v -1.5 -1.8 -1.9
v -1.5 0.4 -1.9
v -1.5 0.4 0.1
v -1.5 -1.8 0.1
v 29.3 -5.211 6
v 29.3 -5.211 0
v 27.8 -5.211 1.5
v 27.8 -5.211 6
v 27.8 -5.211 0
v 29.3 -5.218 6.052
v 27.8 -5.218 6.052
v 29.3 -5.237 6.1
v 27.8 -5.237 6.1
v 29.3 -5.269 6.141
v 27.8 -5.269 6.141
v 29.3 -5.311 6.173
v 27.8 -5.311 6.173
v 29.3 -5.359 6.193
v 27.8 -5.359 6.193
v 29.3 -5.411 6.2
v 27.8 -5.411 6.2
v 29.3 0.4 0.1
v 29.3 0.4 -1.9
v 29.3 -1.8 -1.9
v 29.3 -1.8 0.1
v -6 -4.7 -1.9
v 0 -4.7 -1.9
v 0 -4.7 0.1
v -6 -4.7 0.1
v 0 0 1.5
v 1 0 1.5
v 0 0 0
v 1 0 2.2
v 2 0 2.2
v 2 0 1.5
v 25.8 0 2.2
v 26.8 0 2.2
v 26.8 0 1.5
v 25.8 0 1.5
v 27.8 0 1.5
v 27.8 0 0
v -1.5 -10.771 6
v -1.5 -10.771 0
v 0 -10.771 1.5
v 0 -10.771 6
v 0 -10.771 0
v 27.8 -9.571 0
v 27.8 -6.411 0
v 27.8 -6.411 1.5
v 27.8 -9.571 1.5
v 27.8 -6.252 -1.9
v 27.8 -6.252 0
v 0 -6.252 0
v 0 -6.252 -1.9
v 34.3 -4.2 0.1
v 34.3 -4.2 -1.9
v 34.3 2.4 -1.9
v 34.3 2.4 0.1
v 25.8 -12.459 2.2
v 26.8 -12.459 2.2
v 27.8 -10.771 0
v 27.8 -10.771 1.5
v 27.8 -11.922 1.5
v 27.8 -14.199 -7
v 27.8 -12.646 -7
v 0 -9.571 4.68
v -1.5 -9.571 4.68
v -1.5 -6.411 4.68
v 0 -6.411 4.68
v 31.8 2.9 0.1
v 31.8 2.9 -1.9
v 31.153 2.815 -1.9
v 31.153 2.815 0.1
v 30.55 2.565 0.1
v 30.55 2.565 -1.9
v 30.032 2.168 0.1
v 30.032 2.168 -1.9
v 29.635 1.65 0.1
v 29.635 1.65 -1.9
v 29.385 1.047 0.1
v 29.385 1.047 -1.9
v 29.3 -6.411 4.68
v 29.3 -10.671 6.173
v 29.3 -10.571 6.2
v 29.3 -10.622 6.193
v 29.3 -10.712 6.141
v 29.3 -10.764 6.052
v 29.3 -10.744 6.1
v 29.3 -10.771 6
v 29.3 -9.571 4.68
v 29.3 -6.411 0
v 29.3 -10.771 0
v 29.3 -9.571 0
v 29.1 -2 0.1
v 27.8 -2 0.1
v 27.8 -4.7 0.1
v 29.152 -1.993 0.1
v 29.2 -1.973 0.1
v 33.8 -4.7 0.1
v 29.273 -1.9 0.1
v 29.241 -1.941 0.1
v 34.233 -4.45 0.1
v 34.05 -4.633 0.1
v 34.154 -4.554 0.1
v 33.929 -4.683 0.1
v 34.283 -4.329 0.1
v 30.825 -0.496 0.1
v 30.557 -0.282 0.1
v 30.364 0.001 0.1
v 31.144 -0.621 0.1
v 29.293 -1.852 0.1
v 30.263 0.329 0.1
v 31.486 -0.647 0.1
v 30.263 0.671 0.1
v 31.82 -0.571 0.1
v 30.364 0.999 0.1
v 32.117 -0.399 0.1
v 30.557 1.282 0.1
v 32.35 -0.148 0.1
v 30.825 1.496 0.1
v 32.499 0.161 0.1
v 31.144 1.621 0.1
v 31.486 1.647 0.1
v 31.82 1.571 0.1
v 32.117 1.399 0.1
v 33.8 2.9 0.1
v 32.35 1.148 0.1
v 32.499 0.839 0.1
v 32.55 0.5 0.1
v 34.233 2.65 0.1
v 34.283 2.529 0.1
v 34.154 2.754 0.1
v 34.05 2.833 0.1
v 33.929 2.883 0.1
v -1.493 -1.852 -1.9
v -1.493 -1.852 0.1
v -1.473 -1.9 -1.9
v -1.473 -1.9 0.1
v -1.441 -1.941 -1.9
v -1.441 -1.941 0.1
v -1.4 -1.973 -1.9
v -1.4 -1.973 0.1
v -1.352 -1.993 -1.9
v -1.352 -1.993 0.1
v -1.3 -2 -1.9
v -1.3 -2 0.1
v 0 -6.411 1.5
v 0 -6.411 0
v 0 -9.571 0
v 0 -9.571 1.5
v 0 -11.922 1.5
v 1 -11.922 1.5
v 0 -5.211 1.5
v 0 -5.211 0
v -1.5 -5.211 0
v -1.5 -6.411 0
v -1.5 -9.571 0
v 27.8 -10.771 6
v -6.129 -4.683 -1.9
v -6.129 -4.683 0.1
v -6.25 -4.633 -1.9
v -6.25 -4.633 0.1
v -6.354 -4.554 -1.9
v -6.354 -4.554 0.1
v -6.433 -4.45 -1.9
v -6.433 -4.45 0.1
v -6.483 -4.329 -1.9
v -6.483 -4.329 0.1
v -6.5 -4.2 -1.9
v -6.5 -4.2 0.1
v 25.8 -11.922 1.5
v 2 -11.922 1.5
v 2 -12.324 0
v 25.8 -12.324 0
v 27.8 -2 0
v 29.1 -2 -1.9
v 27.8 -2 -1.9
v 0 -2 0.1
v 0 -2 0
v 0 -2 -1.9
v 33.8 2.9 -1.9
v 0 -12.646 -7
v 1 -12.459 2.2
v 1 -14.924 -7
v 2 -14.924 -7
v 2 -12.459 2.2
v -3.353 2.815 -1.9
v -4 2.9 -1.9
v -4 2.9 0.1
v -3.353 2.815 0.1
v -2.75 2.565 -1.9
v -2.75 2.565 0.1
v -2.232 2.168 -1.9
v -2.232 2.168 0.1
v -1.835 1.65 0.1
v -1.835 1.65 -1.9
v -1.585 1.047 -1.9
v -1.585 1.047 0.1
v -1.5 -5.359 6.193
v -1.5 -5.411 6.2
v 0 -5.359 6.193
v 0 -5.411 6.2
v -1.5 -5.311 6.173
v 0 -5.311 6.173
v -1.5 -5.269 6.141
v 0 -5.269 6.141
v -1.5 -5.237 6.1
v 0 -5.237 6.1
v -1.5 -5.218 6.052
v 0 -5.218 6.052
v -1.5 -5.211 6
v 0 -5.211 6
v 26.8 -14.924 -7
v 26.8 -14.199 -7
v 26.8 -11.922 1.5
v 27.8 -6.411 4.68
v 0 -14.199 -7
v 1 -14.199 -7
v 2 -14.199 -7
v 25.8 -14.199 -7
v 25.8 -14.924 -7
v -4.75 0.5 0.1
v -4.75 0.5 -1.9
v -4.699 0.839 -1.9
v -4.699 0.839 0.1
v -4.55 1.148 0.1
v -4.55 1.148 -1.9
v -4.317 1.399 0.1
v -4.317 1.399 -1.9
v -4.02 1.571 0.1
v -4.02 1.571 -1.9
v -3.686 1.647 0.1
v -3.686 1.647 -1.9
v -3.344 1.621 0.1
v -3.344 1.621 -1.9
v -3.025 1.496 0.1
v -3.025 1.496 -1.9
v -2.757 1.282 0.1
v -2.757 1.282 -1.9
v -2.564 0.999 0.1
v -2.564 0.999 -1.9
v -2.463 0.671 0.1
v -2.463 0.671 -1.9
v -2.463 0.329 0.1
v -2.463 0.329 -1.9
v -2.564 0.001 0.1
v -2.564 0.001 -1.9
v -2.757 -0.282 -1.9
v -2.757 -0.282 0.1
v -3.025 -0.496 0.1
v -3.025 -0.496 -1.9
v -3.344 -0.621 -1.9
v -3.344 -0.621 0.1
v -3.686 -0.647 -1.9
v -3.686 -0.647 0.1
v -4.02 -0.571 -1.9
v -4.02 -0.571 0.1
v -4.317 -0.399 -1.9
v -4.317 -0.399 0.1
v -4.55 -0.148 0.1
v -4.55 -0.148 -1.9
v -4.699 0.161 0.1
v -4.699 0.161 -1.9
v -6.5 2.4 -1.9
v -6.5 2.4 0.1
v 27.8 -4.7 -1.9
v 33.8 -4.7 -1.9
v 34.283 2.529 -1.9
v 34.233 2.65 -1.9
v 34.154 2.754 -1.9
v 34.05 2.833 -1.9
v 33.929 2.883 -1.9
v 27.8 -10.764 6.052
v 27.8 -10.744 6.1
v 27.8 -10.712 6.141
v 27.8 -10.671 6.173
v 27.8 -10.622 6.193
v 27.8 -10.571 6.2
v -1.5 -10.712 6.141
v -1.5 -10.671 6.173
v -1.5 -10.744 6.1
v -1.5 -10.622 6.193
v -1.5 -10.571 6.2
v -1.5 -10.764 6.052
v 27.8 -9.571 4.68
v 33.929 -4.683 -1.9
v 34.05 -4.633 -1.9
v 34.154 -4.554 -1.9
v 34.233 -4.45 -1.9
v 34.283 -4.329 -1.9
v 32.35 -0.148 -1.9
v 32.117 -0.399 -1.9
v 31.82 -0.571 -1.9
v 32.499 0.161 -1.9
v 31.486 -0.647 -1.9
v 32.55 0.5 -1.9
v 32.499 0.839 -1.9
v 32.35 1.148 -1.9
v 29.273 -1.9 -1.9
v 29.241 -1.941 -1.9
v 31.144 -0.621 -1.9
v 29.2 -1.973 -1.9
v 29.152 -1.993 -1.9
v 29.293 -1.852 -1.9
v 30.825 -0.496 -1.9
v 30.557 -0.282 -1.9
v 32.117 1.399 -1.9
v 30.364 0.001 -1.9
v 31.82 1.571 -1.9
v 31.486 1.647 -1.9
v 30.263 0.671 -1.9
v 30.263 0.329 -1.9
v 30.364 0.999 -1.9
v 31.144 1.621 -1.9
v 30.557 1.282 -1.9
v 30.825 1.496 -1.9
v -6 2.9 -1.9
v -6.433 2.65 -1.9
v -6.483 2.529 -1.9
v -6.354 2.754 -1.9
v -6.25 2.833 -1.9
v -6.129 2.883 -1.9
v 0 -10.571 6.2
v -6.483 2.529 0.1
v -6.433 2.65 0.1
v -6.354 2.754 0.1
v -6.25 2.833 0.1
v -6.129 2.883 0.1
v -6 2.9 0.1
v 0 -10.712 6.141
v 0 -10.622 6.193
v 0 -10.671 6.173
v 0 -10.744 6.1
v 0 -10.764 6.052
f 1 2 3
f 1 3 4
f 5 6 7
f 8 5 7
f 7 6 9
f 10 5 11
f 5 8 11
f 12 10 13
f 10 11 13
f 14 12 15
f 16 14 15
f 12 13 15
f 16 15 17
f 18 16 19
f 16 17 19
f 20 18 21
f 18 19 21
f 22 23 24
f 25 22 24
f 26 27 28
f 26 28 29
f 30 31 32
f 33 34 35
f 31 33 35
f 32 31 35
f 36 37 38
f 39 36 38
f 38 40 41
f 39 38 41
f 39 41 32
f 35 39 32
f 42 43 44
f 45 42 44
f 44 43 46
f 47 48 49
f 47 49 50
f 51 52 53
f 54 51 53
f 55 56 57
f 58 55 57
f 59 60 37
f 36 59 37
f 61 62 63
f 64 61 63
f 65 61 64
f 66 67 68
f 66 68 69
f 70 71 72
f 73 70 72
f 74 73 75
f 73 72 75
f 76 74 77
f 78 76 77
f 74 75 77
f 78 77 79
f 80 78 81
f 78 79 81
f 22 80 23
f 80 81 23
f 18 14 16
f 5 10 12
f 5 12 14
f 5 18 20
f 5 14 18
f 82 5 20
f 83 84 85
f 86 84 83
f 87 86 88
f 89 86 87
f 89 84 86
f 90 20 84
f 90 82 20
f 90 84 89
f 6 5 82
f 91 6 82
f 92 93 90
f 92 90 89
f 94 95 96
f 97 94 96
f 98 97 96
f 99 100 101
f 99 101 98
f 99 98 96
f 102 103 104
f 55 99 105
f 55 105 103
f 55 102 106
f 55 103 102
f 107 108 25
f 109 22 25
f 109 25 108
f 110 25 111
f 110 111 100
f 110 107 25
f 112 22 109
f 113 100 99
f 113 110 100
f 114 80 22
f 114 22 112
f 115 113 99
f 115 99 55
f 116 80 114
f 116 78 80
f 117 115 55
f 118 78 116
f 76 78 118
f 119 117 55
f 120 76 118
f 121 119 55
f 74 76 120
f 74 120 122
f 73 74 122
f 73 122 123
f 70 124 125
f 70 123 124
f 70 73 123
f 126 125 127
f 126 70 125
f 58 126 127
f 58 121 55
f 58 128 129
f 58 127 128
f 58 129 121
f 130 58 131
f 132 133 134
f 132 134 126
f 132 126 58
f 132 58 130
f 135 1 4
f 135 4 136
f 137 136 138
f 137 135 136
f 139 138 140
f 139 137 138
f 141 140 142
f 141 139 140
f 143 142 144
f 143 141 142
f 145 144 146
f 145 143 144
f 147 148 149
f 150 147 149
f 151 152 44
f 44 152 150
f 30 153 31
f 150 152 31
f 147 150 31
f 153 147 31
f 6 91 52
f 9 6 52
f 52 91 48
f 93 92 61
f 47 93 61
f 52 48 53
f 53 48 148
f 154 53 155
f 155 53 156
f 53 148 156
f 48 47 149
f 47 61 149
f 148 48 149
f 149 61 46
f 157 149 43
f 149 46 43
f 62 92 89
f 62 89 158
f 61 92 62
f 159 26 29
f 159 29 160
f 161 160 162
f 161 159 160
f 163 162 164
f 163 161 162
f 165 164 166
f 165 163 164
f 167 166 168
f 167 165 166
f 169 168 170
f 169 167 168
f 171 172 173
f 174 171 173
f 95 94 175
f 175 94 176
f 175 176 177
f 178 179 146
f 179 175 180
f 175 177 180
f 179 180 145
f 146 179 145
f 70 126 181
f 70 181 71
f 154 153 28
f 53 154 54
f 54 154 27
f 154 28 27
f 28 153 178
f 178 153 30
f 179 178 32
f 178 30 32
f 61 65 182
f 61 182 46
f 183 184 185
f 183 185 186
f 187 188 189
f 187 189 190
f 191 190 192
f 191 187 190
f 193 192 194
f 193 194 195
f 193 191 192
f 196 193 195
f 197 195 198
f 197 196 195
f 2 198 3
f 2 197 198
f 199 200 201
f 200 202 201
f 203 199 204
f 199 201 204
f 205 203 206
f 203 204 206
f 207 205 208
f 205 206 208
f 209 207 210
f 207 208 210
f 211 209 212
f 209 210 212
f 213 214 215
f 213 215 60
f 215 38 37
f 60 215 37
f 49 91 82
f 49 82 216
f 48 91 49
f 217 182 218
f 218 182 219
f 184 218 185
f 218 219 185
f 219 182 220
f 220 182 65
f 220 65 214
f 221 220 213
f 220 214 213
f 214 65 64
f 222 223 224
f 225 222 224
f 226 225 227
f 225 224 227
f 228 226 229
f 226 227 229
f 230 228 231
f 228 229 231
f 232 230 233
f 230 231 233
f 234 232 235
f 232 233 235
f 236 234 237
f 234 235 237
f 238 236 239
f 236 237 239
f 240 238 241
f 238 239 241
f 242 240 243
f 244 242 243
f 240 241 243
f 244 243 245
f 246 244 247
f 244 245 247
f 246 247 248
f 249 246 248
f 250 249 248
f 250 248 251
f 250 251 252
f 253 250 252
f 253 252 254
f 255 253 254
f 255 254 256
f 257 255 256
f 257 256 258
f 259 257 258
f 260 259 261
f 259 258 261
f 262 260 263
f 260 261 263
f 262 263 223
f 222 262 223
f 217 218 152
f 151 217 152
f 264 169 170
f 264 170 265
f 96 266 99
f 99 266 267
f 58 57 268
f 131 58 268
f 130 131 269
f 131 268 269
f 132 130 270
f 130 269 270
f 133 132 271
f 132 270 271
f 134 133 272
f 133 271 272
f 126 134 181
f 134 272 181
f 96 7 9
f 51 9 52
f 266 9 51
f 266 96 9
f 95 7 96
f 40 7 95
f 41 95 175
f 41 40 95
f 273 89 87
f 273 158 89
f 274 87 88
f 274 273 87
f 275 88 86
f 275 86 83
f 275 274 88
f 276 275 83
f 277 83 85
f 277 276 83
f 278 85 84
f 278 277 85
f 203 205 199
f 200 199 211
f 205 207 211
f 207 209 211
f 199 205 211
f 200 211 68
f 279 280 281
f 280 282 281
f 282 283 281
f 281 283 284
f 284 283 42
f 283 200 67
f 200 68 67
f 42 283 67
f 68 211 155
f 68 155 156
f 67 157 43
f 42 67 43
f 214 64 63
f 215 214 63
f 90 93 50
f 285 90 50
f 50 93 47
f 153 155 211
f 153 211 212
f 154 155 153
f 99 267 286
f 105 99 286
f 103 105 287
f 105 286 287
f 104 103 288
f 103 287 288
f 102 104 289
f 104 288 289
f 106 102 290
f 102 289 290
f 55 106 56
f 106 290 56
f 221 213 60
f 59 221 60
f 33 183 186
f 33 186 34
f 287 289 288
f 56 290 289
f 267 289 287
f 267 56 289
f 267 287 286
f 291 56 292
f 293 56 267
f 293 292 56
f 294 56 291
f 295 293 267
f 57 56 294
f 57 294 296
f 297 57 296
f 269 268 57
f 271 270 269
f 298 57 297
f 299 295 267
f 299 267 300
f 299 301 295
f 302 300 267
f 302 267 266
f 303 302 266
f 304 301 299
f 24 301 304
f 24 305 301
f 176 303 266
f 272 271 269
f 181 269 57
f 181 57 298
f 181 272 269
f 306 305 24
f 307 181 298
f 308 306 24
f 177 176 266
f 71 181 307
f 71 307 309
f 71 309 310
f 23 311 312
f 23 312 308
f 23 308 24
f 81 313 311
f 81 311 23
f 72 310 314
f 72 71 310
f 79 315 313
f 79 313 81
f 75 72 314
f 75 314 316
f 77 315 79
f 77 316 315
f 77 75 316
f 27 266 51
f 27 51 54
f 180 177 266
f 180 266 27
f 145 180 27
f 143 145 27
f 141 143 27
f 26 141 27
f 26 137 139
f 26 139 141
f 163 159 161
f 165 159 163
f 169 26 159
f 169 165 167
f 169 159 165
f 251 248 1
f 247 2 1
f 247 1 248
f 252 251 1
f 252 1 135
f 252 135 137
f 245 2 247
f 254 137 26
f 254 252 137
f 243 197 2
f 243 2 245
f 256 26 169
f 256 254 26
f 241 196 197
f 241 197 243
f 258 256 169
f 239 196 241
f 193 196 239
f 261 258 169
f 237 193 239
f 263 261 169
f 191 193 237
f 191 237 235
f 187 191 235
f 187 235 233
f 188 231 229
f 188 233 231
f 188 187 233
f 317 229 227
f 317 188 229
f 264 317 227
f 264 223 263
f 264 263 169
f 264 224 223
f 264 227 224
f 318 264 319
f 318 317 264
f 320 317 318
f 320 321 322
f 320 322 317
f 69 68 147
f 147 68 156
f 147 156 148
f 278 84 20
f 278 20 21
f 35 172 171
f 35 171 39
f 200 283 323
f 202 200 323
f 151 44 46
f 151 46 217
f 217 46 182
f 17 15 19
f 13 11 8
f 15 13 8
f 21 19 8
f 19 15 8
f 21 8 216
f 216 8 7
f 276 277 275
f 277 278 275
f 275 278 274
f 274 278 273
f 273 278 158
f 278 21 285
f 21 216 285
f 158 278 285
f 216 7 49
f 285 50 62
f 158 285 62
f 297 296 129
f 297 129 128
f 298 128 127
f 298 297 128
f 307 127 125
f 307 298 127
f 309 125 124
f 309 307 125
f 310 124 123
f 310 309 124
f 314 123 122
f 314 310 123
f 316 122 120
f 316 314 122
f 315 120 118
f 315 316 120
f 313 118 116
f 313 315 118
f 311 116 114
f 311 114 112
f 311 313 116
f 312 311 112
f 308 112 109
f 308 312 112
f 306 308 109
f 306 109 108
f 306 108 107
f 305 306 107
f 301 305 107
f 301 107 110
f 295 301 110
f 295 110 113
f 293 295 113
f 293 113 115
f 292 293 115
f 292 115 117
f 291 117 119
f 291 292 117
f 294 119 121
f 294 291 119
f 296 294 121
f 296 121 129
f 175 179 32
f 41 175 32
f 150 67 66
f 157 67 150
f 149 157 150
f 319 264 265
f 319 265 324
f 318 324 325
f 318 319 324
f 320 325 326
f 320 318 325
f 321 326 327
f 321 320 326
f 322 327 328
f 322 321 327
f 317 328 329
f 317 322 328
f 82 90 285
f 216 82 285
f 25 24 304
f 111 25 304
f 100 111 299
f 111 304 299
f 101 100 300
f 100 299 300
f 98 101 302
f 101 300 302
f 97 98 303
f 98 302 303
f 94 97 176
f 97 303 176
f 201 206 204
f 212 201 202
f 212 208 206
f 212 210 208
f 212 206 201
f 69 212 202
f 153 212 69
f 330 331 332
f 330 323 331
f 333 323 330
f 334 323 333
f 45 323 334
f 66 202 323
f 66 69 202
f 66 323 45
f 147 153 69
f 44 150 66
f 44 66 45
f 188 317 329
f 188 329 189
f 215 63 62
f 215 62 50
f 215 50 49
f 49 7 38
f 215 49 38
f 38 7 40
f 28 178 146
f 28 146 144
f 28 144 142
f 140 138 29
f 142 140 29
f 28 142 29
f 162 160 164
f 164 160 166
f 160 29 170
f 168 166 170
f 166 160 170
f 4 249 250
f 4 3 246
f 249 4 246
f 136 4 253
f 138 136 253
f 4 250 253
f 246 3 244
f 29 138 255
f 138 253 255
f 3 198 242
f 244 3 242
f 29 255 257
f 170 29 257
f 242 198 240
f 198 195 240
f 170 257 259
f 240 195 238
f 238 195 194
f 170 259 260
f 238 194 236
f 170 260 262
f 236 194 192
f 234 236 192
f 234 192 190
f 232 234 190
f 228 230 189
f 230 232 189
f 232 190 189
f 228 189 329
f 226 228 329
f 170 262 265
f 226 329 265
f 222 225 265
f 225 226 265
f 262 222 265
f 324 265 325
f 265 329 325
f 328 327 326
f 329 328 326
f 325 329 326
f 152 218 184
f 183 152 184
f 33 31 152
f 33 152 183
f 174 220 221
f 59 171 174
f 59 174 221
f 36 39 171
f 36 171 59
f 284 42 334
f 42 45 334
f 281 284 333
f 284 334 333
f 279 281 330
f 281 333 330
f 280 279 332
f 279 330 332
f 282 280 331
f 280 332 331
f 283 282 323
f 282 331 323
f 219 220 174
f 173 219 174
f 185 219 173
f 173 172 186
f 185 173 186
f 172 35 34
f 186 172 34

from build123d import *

# Parameters (mm, degrees)
SKETCH_1_W          = 27.8
SKETCH_1_H          = 8
EXTRUDE_1_DEPTH     = 7.8
EXTRUDE_2_DEPTH     = 27.8
SKETCH_4_R          = 1.15
EXTRUDE_3_DEPTH     = 2
CUT_EXTRUDE_4_DEPTH = 24.8
SKETCH_15_W         = 27.8
SKETCH_15_H         = 4.251772847
EXTRUDE_4_DEPTH     = 1.9
FILLET_1_R          = 8
FILLET_2_R          = 6.5
EXTRUDE_5_DEPTH     = 27.8
CUT_EXTRUDE_6_DEPTH = 24.8
SKETCH_19_OUTSIDE_W = 26.556
SKETCH_19_OUTSIDE_H = 34.032
CUT_EXTRUDE_7_DEPTH = 40.8
SKETCH_20_W         = 1.5
SKETCH_20_H         = 5.56
EXTRUDE_6_DEPTH     = 6.2
SKETCH_21_W         = 1.5
SKETCH_21_H         = 3.16
CUT_EXTRUDE_8_DEPTH = 4.68
EXTRUDE_7_DEPTH     = 1
FILLET_3_R          = 0.2


with BuildPart() as part:
    # 草图1 → 凸台-拉伸1 (new body)
    with BuildSketch(Plane.XY):
        with Locations((13.9, -4)):
            Rectangle(SKETCH_1_W, SKETCH_1_H)
    extrude(amount=EXTRUDE_1_DEPTH)

    # 草图2 → 凸台-拉伸2 (add)
    with BuildSketch(Plane.ZY):
        Polygon((5.795554958, -15.947085729), (0, -17.5), (0, -8), (7.8, -8), align=None)
    extrude(amount=-EXTRUDE_2_DEPTH)

    # 草图4 → 凸台-拉伸3 (add)
    with BuildSketch(Plane(origin=(0, 0, -1.9), x_dir=(-1, 0, 0), z_dir=(0, 0, -1))):
        with BuildLine():
            Line((0, -2), (0, -4.7))
            Line((0, -4.7), (6, -4.7))
            ThreePointArc((6, -4.7), (6.353553391, -4.553553391), (6.5, -4.2))
            Line((6.5, -4.2), (6.5, -2))
            Line((6.5, -2), (6.5, 2.4))
            ThreePointArc((6.5, 2.4), (6.353553391, 2.753553391), (6, 2.9))
            Line((6, 2.9), (4, 2.9))
            ThreePointArc((4, 2.9), (2.232233047, 2.167766953), (1.5, 0.4))
            Line((1.5, 0.4), (1.5, -1.8))
            ThreePointArc((1.5, -1.8), (1.441421356, -1.941421356), (1.3, -2))
            Line((1.3, -2), (0, -2))
        make_face()
        with Locations((3.6, 0.5)):
            Circle(SKETCH_4_R, mode=Mode.SUBTRACT)
    extrude_3 = extrude(amount=-EXTRUDE_3_DEPTH)

    # 镜向1: 凸台-拉伸3 across plane
    add(extrude_3.mirror(Plane.ZY.offset(-13.9)))

    # 草图13 → 切除-拉伸4 (cut)
    with BuildSketch(Plane.ZY.offset(-1.5)):
        Polygon((1.5, 0), (1.5, -11.921695309), (0, -12.323619098), (0, -15.947085729), (4.556522218, -14.726169281), (6.3, -7.813748582), (6.3, 0), align=None)
    extrude(amount=-CUT_EXTRUDE_4_DEPTH, mode=Mode.SUBTRACT)

    # 草图15 → 凸台-拉伸4 (add)
    with BuildSketch(Plane(origin=(0, 0, 0), x_dir=(-1, 0, 0), z_dir=(0, 0, -1))):
        with Locations((-13.9, -4.125886424)):
            Rectangle(SKETCH_15_W, SKETCH_15_H)
    extrude(amount=EXTRUDE_4_DEPTH)

    # 圆角1
    fillet_1_edges = [part.edges().sort_by_distance(p)[0] for p in [
        (13.9, -14.726169281, 4.556522218),
    ]]
    fillet(fillet_1_edges, radius=FILLET_1_R)

    # 圆角2
    fillet_2_edges = [part.edges().sort_by_distance(p)[0] for p in [
        (13.9, -15.947085729, 5.795554958),
    ]]
    fillet(fillet_2_edges, radius=FILLET_2_R)

    # 草图17 → 凸台-拉伸5 (add)
    with BuildSketch(Plane(origin=(27.8, 0, 0), x_dir=(0, 0, -1), z_dir=(1, 0, 0))):
        Polygon((0, -17.5), (7, -19.375644347), (7, -12.646349174), (0, -10.770704827), align=None)
    extrude(amount=-EXTRUDE_5_DEPTH)

    # 草图18 → 切除-拉伸6 (cut)
    with BuildSketch(Plane.ZY.offset(-26.3)):
        Polygon((0, -12.323619098), (0, -15.947085729), (-7, -17.822730076), (-7, -14.199263445), align=None)
    extrude(amount=CUT_EXTRUDE_6_DEPTH, mode=Mode.SUBTRACT)

    # 草图19 outside → 切除-拉伸7 (cut)
    with BuildSketch(Plane(origin=(34.3, 0, 0), x_dir=(0, 0, -1), z_dir=(1, 0, 0))):
        with Locations((-0.4, -8.238)):
            Rectangle(SKETCH_19_OUTSIDE_W, SKETCH_19_OUTSIDE_H)
        Polygon((7, 2.9), (7, -14.199263445), (-1.5, -11.921695309), (-1.5, 2.9), align=None, mode=Mode.SUBTRACT)
    extrude(amount=-CUT_EXTRUDE_7_DEPTH, mode=Mode.SUBTRACT)

    # 草图20 → 凸台-拉伸6 (add)
    with BuildSketch(Plane(origin=(0, -7.983041289, 0), x_dir=(1, 0, 0), z_dir=(0, 0, -1))):
        with Locations((-0.75, 0.007663538)):
            Rectangle(SKETCH_20_W, SKETCH_20_H)
    extrude_6 = extrude(amount=-EXTRUDE_6_DEPTH)

    # 草图21 → 切除-拉伸8 (cut)
    with BuildSketch(Plane(origin=(0, -7.983041289, 0), x_dir=(1, 0, 0), z_dir=(0, 0, -1))):
        with Locations((-0.75, 0.007663538)):
            Rectangle(SKETCH_21_W, SKETCH_21_H)
    cut_extrude_8 = extrude(amount=-CUT_EXTRUDE_8_DEPTH, mode=Mode.SUBTRACT)

    # 镜向2: 凸台-拉伸6, 切除-拉伸8 across plane
    add(extrude_6.mirror(Plane.ZY.offset(-13.9)))
    add(cut_extrude_8.mirror(Plane.ZY.offset(-13.9)), mode=Mode.SUBTRACT)

    # 草图23 → 凸台-拉伸7 (add)
    with BuildSketch(Plane.ZY.offset(-1)):
        Polygon((1.5, 0), (1.5, -11.921695309), (-7, -14.199263445), (-7, -14.923956771), (2.2, -12.458824201), (2.2, 0), align=None)
    extrude_7 = extrude(amount=-EXTRUDE_7_DEPTH)

    # 镜向3: 凸台-拉伸7 across plane
    add(extrude_7.mirror(Plane.ZY.offset(-13.9)))

    # 圆角3
    fillet_3_edges = [part.edges().sort_by_distance(p)[0] for p in [
        (-0.75, -5.210704827, 6.2),
        (-0.75, -10.770704827, 6.2),
        (28.55, -10.770704827, 6.2),
        (28.55, -5.210704827, 6.2),
    ]]
    fillet(fillet_3_edges, radius=FILLET_3_R)


solid = part.part
